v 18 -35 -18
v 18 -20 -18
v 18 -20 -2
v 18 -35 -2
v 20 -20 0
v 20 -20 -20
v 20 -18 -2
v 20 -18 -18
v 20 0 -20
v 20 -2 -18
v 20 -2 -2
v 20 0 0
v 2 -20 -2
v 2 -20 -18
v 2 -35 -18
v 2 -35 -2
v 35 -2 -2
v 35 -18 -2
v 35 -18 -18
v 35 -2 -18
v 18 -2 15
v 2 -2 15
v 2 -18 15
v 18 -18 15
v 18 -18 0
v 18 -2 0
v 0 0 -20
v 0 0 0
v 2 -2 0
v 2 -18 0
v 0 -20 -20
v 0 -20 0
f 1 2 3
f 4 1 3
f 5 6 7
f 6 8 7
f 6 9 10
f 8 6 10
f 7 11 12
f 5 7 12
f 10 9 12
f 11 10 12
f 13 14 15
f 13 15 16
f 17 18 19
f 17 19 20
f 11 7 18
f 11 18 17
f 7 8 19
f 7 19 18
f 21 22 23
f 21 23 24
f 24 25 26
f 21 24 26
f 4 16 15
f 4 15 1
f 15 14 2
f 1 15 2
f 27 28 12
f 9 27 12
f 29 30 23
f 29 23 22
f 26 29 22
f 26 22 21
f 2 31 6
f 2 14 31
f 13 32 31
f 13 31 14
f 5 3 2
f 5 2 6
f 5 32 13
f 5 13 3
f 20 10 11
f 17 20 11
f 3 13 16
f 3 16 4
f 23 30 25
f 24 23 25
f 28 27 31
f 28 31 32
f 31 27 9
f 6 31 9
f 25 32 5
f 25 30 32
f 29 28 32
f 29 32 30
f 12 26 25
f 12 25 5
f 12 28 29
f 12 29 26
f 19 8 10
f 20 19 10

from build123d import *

# Parameters (mm, degrees)
F0_W     = 20
F0_H     = 20
F1_DEPTH = 20
F2_W     = 16
F2_H     = 16
F3_DEPTH = 15
F4_W     = 16
F4_H     = 16
F5_DEPTH = 15
F6_W     = 16
F6_H     = 16
F7_DEPTH = 15


with BuildPart() as f1:
    # F0 (on Front) → F1 (new body)
    with BuildSketch(Plane.XZ):
        with Locations((10, -10)):
            Rectangle(F0_W, F0_H)
    extrude(amount=F1_DEPTH)

    # F2 (on face) → F3 (join)
    with BuildSketch(Plane.XZ.offset(20)):
        with Locations((10, -10)):
            Rectangle(F2_W, F2_H)
    extrude(amount=F3_DEPTH)

    # F4 (on face) → F5 (join)
    with BuildSketch(Plane.YZ.offset(20)):
        with Locations((-10, -10)):
            Rectangle(F4_W, F4_H)
    extrude(amount=F5_DEPTH)

    # F6 (on face) → F7 (join)
    with BuildSketch(Plane.XY):
        with Locations((10, -10)):
            Rectangle(F6_W, F6_H)
    extrude(amount=F7_DEPTH)


solid = f1.part
